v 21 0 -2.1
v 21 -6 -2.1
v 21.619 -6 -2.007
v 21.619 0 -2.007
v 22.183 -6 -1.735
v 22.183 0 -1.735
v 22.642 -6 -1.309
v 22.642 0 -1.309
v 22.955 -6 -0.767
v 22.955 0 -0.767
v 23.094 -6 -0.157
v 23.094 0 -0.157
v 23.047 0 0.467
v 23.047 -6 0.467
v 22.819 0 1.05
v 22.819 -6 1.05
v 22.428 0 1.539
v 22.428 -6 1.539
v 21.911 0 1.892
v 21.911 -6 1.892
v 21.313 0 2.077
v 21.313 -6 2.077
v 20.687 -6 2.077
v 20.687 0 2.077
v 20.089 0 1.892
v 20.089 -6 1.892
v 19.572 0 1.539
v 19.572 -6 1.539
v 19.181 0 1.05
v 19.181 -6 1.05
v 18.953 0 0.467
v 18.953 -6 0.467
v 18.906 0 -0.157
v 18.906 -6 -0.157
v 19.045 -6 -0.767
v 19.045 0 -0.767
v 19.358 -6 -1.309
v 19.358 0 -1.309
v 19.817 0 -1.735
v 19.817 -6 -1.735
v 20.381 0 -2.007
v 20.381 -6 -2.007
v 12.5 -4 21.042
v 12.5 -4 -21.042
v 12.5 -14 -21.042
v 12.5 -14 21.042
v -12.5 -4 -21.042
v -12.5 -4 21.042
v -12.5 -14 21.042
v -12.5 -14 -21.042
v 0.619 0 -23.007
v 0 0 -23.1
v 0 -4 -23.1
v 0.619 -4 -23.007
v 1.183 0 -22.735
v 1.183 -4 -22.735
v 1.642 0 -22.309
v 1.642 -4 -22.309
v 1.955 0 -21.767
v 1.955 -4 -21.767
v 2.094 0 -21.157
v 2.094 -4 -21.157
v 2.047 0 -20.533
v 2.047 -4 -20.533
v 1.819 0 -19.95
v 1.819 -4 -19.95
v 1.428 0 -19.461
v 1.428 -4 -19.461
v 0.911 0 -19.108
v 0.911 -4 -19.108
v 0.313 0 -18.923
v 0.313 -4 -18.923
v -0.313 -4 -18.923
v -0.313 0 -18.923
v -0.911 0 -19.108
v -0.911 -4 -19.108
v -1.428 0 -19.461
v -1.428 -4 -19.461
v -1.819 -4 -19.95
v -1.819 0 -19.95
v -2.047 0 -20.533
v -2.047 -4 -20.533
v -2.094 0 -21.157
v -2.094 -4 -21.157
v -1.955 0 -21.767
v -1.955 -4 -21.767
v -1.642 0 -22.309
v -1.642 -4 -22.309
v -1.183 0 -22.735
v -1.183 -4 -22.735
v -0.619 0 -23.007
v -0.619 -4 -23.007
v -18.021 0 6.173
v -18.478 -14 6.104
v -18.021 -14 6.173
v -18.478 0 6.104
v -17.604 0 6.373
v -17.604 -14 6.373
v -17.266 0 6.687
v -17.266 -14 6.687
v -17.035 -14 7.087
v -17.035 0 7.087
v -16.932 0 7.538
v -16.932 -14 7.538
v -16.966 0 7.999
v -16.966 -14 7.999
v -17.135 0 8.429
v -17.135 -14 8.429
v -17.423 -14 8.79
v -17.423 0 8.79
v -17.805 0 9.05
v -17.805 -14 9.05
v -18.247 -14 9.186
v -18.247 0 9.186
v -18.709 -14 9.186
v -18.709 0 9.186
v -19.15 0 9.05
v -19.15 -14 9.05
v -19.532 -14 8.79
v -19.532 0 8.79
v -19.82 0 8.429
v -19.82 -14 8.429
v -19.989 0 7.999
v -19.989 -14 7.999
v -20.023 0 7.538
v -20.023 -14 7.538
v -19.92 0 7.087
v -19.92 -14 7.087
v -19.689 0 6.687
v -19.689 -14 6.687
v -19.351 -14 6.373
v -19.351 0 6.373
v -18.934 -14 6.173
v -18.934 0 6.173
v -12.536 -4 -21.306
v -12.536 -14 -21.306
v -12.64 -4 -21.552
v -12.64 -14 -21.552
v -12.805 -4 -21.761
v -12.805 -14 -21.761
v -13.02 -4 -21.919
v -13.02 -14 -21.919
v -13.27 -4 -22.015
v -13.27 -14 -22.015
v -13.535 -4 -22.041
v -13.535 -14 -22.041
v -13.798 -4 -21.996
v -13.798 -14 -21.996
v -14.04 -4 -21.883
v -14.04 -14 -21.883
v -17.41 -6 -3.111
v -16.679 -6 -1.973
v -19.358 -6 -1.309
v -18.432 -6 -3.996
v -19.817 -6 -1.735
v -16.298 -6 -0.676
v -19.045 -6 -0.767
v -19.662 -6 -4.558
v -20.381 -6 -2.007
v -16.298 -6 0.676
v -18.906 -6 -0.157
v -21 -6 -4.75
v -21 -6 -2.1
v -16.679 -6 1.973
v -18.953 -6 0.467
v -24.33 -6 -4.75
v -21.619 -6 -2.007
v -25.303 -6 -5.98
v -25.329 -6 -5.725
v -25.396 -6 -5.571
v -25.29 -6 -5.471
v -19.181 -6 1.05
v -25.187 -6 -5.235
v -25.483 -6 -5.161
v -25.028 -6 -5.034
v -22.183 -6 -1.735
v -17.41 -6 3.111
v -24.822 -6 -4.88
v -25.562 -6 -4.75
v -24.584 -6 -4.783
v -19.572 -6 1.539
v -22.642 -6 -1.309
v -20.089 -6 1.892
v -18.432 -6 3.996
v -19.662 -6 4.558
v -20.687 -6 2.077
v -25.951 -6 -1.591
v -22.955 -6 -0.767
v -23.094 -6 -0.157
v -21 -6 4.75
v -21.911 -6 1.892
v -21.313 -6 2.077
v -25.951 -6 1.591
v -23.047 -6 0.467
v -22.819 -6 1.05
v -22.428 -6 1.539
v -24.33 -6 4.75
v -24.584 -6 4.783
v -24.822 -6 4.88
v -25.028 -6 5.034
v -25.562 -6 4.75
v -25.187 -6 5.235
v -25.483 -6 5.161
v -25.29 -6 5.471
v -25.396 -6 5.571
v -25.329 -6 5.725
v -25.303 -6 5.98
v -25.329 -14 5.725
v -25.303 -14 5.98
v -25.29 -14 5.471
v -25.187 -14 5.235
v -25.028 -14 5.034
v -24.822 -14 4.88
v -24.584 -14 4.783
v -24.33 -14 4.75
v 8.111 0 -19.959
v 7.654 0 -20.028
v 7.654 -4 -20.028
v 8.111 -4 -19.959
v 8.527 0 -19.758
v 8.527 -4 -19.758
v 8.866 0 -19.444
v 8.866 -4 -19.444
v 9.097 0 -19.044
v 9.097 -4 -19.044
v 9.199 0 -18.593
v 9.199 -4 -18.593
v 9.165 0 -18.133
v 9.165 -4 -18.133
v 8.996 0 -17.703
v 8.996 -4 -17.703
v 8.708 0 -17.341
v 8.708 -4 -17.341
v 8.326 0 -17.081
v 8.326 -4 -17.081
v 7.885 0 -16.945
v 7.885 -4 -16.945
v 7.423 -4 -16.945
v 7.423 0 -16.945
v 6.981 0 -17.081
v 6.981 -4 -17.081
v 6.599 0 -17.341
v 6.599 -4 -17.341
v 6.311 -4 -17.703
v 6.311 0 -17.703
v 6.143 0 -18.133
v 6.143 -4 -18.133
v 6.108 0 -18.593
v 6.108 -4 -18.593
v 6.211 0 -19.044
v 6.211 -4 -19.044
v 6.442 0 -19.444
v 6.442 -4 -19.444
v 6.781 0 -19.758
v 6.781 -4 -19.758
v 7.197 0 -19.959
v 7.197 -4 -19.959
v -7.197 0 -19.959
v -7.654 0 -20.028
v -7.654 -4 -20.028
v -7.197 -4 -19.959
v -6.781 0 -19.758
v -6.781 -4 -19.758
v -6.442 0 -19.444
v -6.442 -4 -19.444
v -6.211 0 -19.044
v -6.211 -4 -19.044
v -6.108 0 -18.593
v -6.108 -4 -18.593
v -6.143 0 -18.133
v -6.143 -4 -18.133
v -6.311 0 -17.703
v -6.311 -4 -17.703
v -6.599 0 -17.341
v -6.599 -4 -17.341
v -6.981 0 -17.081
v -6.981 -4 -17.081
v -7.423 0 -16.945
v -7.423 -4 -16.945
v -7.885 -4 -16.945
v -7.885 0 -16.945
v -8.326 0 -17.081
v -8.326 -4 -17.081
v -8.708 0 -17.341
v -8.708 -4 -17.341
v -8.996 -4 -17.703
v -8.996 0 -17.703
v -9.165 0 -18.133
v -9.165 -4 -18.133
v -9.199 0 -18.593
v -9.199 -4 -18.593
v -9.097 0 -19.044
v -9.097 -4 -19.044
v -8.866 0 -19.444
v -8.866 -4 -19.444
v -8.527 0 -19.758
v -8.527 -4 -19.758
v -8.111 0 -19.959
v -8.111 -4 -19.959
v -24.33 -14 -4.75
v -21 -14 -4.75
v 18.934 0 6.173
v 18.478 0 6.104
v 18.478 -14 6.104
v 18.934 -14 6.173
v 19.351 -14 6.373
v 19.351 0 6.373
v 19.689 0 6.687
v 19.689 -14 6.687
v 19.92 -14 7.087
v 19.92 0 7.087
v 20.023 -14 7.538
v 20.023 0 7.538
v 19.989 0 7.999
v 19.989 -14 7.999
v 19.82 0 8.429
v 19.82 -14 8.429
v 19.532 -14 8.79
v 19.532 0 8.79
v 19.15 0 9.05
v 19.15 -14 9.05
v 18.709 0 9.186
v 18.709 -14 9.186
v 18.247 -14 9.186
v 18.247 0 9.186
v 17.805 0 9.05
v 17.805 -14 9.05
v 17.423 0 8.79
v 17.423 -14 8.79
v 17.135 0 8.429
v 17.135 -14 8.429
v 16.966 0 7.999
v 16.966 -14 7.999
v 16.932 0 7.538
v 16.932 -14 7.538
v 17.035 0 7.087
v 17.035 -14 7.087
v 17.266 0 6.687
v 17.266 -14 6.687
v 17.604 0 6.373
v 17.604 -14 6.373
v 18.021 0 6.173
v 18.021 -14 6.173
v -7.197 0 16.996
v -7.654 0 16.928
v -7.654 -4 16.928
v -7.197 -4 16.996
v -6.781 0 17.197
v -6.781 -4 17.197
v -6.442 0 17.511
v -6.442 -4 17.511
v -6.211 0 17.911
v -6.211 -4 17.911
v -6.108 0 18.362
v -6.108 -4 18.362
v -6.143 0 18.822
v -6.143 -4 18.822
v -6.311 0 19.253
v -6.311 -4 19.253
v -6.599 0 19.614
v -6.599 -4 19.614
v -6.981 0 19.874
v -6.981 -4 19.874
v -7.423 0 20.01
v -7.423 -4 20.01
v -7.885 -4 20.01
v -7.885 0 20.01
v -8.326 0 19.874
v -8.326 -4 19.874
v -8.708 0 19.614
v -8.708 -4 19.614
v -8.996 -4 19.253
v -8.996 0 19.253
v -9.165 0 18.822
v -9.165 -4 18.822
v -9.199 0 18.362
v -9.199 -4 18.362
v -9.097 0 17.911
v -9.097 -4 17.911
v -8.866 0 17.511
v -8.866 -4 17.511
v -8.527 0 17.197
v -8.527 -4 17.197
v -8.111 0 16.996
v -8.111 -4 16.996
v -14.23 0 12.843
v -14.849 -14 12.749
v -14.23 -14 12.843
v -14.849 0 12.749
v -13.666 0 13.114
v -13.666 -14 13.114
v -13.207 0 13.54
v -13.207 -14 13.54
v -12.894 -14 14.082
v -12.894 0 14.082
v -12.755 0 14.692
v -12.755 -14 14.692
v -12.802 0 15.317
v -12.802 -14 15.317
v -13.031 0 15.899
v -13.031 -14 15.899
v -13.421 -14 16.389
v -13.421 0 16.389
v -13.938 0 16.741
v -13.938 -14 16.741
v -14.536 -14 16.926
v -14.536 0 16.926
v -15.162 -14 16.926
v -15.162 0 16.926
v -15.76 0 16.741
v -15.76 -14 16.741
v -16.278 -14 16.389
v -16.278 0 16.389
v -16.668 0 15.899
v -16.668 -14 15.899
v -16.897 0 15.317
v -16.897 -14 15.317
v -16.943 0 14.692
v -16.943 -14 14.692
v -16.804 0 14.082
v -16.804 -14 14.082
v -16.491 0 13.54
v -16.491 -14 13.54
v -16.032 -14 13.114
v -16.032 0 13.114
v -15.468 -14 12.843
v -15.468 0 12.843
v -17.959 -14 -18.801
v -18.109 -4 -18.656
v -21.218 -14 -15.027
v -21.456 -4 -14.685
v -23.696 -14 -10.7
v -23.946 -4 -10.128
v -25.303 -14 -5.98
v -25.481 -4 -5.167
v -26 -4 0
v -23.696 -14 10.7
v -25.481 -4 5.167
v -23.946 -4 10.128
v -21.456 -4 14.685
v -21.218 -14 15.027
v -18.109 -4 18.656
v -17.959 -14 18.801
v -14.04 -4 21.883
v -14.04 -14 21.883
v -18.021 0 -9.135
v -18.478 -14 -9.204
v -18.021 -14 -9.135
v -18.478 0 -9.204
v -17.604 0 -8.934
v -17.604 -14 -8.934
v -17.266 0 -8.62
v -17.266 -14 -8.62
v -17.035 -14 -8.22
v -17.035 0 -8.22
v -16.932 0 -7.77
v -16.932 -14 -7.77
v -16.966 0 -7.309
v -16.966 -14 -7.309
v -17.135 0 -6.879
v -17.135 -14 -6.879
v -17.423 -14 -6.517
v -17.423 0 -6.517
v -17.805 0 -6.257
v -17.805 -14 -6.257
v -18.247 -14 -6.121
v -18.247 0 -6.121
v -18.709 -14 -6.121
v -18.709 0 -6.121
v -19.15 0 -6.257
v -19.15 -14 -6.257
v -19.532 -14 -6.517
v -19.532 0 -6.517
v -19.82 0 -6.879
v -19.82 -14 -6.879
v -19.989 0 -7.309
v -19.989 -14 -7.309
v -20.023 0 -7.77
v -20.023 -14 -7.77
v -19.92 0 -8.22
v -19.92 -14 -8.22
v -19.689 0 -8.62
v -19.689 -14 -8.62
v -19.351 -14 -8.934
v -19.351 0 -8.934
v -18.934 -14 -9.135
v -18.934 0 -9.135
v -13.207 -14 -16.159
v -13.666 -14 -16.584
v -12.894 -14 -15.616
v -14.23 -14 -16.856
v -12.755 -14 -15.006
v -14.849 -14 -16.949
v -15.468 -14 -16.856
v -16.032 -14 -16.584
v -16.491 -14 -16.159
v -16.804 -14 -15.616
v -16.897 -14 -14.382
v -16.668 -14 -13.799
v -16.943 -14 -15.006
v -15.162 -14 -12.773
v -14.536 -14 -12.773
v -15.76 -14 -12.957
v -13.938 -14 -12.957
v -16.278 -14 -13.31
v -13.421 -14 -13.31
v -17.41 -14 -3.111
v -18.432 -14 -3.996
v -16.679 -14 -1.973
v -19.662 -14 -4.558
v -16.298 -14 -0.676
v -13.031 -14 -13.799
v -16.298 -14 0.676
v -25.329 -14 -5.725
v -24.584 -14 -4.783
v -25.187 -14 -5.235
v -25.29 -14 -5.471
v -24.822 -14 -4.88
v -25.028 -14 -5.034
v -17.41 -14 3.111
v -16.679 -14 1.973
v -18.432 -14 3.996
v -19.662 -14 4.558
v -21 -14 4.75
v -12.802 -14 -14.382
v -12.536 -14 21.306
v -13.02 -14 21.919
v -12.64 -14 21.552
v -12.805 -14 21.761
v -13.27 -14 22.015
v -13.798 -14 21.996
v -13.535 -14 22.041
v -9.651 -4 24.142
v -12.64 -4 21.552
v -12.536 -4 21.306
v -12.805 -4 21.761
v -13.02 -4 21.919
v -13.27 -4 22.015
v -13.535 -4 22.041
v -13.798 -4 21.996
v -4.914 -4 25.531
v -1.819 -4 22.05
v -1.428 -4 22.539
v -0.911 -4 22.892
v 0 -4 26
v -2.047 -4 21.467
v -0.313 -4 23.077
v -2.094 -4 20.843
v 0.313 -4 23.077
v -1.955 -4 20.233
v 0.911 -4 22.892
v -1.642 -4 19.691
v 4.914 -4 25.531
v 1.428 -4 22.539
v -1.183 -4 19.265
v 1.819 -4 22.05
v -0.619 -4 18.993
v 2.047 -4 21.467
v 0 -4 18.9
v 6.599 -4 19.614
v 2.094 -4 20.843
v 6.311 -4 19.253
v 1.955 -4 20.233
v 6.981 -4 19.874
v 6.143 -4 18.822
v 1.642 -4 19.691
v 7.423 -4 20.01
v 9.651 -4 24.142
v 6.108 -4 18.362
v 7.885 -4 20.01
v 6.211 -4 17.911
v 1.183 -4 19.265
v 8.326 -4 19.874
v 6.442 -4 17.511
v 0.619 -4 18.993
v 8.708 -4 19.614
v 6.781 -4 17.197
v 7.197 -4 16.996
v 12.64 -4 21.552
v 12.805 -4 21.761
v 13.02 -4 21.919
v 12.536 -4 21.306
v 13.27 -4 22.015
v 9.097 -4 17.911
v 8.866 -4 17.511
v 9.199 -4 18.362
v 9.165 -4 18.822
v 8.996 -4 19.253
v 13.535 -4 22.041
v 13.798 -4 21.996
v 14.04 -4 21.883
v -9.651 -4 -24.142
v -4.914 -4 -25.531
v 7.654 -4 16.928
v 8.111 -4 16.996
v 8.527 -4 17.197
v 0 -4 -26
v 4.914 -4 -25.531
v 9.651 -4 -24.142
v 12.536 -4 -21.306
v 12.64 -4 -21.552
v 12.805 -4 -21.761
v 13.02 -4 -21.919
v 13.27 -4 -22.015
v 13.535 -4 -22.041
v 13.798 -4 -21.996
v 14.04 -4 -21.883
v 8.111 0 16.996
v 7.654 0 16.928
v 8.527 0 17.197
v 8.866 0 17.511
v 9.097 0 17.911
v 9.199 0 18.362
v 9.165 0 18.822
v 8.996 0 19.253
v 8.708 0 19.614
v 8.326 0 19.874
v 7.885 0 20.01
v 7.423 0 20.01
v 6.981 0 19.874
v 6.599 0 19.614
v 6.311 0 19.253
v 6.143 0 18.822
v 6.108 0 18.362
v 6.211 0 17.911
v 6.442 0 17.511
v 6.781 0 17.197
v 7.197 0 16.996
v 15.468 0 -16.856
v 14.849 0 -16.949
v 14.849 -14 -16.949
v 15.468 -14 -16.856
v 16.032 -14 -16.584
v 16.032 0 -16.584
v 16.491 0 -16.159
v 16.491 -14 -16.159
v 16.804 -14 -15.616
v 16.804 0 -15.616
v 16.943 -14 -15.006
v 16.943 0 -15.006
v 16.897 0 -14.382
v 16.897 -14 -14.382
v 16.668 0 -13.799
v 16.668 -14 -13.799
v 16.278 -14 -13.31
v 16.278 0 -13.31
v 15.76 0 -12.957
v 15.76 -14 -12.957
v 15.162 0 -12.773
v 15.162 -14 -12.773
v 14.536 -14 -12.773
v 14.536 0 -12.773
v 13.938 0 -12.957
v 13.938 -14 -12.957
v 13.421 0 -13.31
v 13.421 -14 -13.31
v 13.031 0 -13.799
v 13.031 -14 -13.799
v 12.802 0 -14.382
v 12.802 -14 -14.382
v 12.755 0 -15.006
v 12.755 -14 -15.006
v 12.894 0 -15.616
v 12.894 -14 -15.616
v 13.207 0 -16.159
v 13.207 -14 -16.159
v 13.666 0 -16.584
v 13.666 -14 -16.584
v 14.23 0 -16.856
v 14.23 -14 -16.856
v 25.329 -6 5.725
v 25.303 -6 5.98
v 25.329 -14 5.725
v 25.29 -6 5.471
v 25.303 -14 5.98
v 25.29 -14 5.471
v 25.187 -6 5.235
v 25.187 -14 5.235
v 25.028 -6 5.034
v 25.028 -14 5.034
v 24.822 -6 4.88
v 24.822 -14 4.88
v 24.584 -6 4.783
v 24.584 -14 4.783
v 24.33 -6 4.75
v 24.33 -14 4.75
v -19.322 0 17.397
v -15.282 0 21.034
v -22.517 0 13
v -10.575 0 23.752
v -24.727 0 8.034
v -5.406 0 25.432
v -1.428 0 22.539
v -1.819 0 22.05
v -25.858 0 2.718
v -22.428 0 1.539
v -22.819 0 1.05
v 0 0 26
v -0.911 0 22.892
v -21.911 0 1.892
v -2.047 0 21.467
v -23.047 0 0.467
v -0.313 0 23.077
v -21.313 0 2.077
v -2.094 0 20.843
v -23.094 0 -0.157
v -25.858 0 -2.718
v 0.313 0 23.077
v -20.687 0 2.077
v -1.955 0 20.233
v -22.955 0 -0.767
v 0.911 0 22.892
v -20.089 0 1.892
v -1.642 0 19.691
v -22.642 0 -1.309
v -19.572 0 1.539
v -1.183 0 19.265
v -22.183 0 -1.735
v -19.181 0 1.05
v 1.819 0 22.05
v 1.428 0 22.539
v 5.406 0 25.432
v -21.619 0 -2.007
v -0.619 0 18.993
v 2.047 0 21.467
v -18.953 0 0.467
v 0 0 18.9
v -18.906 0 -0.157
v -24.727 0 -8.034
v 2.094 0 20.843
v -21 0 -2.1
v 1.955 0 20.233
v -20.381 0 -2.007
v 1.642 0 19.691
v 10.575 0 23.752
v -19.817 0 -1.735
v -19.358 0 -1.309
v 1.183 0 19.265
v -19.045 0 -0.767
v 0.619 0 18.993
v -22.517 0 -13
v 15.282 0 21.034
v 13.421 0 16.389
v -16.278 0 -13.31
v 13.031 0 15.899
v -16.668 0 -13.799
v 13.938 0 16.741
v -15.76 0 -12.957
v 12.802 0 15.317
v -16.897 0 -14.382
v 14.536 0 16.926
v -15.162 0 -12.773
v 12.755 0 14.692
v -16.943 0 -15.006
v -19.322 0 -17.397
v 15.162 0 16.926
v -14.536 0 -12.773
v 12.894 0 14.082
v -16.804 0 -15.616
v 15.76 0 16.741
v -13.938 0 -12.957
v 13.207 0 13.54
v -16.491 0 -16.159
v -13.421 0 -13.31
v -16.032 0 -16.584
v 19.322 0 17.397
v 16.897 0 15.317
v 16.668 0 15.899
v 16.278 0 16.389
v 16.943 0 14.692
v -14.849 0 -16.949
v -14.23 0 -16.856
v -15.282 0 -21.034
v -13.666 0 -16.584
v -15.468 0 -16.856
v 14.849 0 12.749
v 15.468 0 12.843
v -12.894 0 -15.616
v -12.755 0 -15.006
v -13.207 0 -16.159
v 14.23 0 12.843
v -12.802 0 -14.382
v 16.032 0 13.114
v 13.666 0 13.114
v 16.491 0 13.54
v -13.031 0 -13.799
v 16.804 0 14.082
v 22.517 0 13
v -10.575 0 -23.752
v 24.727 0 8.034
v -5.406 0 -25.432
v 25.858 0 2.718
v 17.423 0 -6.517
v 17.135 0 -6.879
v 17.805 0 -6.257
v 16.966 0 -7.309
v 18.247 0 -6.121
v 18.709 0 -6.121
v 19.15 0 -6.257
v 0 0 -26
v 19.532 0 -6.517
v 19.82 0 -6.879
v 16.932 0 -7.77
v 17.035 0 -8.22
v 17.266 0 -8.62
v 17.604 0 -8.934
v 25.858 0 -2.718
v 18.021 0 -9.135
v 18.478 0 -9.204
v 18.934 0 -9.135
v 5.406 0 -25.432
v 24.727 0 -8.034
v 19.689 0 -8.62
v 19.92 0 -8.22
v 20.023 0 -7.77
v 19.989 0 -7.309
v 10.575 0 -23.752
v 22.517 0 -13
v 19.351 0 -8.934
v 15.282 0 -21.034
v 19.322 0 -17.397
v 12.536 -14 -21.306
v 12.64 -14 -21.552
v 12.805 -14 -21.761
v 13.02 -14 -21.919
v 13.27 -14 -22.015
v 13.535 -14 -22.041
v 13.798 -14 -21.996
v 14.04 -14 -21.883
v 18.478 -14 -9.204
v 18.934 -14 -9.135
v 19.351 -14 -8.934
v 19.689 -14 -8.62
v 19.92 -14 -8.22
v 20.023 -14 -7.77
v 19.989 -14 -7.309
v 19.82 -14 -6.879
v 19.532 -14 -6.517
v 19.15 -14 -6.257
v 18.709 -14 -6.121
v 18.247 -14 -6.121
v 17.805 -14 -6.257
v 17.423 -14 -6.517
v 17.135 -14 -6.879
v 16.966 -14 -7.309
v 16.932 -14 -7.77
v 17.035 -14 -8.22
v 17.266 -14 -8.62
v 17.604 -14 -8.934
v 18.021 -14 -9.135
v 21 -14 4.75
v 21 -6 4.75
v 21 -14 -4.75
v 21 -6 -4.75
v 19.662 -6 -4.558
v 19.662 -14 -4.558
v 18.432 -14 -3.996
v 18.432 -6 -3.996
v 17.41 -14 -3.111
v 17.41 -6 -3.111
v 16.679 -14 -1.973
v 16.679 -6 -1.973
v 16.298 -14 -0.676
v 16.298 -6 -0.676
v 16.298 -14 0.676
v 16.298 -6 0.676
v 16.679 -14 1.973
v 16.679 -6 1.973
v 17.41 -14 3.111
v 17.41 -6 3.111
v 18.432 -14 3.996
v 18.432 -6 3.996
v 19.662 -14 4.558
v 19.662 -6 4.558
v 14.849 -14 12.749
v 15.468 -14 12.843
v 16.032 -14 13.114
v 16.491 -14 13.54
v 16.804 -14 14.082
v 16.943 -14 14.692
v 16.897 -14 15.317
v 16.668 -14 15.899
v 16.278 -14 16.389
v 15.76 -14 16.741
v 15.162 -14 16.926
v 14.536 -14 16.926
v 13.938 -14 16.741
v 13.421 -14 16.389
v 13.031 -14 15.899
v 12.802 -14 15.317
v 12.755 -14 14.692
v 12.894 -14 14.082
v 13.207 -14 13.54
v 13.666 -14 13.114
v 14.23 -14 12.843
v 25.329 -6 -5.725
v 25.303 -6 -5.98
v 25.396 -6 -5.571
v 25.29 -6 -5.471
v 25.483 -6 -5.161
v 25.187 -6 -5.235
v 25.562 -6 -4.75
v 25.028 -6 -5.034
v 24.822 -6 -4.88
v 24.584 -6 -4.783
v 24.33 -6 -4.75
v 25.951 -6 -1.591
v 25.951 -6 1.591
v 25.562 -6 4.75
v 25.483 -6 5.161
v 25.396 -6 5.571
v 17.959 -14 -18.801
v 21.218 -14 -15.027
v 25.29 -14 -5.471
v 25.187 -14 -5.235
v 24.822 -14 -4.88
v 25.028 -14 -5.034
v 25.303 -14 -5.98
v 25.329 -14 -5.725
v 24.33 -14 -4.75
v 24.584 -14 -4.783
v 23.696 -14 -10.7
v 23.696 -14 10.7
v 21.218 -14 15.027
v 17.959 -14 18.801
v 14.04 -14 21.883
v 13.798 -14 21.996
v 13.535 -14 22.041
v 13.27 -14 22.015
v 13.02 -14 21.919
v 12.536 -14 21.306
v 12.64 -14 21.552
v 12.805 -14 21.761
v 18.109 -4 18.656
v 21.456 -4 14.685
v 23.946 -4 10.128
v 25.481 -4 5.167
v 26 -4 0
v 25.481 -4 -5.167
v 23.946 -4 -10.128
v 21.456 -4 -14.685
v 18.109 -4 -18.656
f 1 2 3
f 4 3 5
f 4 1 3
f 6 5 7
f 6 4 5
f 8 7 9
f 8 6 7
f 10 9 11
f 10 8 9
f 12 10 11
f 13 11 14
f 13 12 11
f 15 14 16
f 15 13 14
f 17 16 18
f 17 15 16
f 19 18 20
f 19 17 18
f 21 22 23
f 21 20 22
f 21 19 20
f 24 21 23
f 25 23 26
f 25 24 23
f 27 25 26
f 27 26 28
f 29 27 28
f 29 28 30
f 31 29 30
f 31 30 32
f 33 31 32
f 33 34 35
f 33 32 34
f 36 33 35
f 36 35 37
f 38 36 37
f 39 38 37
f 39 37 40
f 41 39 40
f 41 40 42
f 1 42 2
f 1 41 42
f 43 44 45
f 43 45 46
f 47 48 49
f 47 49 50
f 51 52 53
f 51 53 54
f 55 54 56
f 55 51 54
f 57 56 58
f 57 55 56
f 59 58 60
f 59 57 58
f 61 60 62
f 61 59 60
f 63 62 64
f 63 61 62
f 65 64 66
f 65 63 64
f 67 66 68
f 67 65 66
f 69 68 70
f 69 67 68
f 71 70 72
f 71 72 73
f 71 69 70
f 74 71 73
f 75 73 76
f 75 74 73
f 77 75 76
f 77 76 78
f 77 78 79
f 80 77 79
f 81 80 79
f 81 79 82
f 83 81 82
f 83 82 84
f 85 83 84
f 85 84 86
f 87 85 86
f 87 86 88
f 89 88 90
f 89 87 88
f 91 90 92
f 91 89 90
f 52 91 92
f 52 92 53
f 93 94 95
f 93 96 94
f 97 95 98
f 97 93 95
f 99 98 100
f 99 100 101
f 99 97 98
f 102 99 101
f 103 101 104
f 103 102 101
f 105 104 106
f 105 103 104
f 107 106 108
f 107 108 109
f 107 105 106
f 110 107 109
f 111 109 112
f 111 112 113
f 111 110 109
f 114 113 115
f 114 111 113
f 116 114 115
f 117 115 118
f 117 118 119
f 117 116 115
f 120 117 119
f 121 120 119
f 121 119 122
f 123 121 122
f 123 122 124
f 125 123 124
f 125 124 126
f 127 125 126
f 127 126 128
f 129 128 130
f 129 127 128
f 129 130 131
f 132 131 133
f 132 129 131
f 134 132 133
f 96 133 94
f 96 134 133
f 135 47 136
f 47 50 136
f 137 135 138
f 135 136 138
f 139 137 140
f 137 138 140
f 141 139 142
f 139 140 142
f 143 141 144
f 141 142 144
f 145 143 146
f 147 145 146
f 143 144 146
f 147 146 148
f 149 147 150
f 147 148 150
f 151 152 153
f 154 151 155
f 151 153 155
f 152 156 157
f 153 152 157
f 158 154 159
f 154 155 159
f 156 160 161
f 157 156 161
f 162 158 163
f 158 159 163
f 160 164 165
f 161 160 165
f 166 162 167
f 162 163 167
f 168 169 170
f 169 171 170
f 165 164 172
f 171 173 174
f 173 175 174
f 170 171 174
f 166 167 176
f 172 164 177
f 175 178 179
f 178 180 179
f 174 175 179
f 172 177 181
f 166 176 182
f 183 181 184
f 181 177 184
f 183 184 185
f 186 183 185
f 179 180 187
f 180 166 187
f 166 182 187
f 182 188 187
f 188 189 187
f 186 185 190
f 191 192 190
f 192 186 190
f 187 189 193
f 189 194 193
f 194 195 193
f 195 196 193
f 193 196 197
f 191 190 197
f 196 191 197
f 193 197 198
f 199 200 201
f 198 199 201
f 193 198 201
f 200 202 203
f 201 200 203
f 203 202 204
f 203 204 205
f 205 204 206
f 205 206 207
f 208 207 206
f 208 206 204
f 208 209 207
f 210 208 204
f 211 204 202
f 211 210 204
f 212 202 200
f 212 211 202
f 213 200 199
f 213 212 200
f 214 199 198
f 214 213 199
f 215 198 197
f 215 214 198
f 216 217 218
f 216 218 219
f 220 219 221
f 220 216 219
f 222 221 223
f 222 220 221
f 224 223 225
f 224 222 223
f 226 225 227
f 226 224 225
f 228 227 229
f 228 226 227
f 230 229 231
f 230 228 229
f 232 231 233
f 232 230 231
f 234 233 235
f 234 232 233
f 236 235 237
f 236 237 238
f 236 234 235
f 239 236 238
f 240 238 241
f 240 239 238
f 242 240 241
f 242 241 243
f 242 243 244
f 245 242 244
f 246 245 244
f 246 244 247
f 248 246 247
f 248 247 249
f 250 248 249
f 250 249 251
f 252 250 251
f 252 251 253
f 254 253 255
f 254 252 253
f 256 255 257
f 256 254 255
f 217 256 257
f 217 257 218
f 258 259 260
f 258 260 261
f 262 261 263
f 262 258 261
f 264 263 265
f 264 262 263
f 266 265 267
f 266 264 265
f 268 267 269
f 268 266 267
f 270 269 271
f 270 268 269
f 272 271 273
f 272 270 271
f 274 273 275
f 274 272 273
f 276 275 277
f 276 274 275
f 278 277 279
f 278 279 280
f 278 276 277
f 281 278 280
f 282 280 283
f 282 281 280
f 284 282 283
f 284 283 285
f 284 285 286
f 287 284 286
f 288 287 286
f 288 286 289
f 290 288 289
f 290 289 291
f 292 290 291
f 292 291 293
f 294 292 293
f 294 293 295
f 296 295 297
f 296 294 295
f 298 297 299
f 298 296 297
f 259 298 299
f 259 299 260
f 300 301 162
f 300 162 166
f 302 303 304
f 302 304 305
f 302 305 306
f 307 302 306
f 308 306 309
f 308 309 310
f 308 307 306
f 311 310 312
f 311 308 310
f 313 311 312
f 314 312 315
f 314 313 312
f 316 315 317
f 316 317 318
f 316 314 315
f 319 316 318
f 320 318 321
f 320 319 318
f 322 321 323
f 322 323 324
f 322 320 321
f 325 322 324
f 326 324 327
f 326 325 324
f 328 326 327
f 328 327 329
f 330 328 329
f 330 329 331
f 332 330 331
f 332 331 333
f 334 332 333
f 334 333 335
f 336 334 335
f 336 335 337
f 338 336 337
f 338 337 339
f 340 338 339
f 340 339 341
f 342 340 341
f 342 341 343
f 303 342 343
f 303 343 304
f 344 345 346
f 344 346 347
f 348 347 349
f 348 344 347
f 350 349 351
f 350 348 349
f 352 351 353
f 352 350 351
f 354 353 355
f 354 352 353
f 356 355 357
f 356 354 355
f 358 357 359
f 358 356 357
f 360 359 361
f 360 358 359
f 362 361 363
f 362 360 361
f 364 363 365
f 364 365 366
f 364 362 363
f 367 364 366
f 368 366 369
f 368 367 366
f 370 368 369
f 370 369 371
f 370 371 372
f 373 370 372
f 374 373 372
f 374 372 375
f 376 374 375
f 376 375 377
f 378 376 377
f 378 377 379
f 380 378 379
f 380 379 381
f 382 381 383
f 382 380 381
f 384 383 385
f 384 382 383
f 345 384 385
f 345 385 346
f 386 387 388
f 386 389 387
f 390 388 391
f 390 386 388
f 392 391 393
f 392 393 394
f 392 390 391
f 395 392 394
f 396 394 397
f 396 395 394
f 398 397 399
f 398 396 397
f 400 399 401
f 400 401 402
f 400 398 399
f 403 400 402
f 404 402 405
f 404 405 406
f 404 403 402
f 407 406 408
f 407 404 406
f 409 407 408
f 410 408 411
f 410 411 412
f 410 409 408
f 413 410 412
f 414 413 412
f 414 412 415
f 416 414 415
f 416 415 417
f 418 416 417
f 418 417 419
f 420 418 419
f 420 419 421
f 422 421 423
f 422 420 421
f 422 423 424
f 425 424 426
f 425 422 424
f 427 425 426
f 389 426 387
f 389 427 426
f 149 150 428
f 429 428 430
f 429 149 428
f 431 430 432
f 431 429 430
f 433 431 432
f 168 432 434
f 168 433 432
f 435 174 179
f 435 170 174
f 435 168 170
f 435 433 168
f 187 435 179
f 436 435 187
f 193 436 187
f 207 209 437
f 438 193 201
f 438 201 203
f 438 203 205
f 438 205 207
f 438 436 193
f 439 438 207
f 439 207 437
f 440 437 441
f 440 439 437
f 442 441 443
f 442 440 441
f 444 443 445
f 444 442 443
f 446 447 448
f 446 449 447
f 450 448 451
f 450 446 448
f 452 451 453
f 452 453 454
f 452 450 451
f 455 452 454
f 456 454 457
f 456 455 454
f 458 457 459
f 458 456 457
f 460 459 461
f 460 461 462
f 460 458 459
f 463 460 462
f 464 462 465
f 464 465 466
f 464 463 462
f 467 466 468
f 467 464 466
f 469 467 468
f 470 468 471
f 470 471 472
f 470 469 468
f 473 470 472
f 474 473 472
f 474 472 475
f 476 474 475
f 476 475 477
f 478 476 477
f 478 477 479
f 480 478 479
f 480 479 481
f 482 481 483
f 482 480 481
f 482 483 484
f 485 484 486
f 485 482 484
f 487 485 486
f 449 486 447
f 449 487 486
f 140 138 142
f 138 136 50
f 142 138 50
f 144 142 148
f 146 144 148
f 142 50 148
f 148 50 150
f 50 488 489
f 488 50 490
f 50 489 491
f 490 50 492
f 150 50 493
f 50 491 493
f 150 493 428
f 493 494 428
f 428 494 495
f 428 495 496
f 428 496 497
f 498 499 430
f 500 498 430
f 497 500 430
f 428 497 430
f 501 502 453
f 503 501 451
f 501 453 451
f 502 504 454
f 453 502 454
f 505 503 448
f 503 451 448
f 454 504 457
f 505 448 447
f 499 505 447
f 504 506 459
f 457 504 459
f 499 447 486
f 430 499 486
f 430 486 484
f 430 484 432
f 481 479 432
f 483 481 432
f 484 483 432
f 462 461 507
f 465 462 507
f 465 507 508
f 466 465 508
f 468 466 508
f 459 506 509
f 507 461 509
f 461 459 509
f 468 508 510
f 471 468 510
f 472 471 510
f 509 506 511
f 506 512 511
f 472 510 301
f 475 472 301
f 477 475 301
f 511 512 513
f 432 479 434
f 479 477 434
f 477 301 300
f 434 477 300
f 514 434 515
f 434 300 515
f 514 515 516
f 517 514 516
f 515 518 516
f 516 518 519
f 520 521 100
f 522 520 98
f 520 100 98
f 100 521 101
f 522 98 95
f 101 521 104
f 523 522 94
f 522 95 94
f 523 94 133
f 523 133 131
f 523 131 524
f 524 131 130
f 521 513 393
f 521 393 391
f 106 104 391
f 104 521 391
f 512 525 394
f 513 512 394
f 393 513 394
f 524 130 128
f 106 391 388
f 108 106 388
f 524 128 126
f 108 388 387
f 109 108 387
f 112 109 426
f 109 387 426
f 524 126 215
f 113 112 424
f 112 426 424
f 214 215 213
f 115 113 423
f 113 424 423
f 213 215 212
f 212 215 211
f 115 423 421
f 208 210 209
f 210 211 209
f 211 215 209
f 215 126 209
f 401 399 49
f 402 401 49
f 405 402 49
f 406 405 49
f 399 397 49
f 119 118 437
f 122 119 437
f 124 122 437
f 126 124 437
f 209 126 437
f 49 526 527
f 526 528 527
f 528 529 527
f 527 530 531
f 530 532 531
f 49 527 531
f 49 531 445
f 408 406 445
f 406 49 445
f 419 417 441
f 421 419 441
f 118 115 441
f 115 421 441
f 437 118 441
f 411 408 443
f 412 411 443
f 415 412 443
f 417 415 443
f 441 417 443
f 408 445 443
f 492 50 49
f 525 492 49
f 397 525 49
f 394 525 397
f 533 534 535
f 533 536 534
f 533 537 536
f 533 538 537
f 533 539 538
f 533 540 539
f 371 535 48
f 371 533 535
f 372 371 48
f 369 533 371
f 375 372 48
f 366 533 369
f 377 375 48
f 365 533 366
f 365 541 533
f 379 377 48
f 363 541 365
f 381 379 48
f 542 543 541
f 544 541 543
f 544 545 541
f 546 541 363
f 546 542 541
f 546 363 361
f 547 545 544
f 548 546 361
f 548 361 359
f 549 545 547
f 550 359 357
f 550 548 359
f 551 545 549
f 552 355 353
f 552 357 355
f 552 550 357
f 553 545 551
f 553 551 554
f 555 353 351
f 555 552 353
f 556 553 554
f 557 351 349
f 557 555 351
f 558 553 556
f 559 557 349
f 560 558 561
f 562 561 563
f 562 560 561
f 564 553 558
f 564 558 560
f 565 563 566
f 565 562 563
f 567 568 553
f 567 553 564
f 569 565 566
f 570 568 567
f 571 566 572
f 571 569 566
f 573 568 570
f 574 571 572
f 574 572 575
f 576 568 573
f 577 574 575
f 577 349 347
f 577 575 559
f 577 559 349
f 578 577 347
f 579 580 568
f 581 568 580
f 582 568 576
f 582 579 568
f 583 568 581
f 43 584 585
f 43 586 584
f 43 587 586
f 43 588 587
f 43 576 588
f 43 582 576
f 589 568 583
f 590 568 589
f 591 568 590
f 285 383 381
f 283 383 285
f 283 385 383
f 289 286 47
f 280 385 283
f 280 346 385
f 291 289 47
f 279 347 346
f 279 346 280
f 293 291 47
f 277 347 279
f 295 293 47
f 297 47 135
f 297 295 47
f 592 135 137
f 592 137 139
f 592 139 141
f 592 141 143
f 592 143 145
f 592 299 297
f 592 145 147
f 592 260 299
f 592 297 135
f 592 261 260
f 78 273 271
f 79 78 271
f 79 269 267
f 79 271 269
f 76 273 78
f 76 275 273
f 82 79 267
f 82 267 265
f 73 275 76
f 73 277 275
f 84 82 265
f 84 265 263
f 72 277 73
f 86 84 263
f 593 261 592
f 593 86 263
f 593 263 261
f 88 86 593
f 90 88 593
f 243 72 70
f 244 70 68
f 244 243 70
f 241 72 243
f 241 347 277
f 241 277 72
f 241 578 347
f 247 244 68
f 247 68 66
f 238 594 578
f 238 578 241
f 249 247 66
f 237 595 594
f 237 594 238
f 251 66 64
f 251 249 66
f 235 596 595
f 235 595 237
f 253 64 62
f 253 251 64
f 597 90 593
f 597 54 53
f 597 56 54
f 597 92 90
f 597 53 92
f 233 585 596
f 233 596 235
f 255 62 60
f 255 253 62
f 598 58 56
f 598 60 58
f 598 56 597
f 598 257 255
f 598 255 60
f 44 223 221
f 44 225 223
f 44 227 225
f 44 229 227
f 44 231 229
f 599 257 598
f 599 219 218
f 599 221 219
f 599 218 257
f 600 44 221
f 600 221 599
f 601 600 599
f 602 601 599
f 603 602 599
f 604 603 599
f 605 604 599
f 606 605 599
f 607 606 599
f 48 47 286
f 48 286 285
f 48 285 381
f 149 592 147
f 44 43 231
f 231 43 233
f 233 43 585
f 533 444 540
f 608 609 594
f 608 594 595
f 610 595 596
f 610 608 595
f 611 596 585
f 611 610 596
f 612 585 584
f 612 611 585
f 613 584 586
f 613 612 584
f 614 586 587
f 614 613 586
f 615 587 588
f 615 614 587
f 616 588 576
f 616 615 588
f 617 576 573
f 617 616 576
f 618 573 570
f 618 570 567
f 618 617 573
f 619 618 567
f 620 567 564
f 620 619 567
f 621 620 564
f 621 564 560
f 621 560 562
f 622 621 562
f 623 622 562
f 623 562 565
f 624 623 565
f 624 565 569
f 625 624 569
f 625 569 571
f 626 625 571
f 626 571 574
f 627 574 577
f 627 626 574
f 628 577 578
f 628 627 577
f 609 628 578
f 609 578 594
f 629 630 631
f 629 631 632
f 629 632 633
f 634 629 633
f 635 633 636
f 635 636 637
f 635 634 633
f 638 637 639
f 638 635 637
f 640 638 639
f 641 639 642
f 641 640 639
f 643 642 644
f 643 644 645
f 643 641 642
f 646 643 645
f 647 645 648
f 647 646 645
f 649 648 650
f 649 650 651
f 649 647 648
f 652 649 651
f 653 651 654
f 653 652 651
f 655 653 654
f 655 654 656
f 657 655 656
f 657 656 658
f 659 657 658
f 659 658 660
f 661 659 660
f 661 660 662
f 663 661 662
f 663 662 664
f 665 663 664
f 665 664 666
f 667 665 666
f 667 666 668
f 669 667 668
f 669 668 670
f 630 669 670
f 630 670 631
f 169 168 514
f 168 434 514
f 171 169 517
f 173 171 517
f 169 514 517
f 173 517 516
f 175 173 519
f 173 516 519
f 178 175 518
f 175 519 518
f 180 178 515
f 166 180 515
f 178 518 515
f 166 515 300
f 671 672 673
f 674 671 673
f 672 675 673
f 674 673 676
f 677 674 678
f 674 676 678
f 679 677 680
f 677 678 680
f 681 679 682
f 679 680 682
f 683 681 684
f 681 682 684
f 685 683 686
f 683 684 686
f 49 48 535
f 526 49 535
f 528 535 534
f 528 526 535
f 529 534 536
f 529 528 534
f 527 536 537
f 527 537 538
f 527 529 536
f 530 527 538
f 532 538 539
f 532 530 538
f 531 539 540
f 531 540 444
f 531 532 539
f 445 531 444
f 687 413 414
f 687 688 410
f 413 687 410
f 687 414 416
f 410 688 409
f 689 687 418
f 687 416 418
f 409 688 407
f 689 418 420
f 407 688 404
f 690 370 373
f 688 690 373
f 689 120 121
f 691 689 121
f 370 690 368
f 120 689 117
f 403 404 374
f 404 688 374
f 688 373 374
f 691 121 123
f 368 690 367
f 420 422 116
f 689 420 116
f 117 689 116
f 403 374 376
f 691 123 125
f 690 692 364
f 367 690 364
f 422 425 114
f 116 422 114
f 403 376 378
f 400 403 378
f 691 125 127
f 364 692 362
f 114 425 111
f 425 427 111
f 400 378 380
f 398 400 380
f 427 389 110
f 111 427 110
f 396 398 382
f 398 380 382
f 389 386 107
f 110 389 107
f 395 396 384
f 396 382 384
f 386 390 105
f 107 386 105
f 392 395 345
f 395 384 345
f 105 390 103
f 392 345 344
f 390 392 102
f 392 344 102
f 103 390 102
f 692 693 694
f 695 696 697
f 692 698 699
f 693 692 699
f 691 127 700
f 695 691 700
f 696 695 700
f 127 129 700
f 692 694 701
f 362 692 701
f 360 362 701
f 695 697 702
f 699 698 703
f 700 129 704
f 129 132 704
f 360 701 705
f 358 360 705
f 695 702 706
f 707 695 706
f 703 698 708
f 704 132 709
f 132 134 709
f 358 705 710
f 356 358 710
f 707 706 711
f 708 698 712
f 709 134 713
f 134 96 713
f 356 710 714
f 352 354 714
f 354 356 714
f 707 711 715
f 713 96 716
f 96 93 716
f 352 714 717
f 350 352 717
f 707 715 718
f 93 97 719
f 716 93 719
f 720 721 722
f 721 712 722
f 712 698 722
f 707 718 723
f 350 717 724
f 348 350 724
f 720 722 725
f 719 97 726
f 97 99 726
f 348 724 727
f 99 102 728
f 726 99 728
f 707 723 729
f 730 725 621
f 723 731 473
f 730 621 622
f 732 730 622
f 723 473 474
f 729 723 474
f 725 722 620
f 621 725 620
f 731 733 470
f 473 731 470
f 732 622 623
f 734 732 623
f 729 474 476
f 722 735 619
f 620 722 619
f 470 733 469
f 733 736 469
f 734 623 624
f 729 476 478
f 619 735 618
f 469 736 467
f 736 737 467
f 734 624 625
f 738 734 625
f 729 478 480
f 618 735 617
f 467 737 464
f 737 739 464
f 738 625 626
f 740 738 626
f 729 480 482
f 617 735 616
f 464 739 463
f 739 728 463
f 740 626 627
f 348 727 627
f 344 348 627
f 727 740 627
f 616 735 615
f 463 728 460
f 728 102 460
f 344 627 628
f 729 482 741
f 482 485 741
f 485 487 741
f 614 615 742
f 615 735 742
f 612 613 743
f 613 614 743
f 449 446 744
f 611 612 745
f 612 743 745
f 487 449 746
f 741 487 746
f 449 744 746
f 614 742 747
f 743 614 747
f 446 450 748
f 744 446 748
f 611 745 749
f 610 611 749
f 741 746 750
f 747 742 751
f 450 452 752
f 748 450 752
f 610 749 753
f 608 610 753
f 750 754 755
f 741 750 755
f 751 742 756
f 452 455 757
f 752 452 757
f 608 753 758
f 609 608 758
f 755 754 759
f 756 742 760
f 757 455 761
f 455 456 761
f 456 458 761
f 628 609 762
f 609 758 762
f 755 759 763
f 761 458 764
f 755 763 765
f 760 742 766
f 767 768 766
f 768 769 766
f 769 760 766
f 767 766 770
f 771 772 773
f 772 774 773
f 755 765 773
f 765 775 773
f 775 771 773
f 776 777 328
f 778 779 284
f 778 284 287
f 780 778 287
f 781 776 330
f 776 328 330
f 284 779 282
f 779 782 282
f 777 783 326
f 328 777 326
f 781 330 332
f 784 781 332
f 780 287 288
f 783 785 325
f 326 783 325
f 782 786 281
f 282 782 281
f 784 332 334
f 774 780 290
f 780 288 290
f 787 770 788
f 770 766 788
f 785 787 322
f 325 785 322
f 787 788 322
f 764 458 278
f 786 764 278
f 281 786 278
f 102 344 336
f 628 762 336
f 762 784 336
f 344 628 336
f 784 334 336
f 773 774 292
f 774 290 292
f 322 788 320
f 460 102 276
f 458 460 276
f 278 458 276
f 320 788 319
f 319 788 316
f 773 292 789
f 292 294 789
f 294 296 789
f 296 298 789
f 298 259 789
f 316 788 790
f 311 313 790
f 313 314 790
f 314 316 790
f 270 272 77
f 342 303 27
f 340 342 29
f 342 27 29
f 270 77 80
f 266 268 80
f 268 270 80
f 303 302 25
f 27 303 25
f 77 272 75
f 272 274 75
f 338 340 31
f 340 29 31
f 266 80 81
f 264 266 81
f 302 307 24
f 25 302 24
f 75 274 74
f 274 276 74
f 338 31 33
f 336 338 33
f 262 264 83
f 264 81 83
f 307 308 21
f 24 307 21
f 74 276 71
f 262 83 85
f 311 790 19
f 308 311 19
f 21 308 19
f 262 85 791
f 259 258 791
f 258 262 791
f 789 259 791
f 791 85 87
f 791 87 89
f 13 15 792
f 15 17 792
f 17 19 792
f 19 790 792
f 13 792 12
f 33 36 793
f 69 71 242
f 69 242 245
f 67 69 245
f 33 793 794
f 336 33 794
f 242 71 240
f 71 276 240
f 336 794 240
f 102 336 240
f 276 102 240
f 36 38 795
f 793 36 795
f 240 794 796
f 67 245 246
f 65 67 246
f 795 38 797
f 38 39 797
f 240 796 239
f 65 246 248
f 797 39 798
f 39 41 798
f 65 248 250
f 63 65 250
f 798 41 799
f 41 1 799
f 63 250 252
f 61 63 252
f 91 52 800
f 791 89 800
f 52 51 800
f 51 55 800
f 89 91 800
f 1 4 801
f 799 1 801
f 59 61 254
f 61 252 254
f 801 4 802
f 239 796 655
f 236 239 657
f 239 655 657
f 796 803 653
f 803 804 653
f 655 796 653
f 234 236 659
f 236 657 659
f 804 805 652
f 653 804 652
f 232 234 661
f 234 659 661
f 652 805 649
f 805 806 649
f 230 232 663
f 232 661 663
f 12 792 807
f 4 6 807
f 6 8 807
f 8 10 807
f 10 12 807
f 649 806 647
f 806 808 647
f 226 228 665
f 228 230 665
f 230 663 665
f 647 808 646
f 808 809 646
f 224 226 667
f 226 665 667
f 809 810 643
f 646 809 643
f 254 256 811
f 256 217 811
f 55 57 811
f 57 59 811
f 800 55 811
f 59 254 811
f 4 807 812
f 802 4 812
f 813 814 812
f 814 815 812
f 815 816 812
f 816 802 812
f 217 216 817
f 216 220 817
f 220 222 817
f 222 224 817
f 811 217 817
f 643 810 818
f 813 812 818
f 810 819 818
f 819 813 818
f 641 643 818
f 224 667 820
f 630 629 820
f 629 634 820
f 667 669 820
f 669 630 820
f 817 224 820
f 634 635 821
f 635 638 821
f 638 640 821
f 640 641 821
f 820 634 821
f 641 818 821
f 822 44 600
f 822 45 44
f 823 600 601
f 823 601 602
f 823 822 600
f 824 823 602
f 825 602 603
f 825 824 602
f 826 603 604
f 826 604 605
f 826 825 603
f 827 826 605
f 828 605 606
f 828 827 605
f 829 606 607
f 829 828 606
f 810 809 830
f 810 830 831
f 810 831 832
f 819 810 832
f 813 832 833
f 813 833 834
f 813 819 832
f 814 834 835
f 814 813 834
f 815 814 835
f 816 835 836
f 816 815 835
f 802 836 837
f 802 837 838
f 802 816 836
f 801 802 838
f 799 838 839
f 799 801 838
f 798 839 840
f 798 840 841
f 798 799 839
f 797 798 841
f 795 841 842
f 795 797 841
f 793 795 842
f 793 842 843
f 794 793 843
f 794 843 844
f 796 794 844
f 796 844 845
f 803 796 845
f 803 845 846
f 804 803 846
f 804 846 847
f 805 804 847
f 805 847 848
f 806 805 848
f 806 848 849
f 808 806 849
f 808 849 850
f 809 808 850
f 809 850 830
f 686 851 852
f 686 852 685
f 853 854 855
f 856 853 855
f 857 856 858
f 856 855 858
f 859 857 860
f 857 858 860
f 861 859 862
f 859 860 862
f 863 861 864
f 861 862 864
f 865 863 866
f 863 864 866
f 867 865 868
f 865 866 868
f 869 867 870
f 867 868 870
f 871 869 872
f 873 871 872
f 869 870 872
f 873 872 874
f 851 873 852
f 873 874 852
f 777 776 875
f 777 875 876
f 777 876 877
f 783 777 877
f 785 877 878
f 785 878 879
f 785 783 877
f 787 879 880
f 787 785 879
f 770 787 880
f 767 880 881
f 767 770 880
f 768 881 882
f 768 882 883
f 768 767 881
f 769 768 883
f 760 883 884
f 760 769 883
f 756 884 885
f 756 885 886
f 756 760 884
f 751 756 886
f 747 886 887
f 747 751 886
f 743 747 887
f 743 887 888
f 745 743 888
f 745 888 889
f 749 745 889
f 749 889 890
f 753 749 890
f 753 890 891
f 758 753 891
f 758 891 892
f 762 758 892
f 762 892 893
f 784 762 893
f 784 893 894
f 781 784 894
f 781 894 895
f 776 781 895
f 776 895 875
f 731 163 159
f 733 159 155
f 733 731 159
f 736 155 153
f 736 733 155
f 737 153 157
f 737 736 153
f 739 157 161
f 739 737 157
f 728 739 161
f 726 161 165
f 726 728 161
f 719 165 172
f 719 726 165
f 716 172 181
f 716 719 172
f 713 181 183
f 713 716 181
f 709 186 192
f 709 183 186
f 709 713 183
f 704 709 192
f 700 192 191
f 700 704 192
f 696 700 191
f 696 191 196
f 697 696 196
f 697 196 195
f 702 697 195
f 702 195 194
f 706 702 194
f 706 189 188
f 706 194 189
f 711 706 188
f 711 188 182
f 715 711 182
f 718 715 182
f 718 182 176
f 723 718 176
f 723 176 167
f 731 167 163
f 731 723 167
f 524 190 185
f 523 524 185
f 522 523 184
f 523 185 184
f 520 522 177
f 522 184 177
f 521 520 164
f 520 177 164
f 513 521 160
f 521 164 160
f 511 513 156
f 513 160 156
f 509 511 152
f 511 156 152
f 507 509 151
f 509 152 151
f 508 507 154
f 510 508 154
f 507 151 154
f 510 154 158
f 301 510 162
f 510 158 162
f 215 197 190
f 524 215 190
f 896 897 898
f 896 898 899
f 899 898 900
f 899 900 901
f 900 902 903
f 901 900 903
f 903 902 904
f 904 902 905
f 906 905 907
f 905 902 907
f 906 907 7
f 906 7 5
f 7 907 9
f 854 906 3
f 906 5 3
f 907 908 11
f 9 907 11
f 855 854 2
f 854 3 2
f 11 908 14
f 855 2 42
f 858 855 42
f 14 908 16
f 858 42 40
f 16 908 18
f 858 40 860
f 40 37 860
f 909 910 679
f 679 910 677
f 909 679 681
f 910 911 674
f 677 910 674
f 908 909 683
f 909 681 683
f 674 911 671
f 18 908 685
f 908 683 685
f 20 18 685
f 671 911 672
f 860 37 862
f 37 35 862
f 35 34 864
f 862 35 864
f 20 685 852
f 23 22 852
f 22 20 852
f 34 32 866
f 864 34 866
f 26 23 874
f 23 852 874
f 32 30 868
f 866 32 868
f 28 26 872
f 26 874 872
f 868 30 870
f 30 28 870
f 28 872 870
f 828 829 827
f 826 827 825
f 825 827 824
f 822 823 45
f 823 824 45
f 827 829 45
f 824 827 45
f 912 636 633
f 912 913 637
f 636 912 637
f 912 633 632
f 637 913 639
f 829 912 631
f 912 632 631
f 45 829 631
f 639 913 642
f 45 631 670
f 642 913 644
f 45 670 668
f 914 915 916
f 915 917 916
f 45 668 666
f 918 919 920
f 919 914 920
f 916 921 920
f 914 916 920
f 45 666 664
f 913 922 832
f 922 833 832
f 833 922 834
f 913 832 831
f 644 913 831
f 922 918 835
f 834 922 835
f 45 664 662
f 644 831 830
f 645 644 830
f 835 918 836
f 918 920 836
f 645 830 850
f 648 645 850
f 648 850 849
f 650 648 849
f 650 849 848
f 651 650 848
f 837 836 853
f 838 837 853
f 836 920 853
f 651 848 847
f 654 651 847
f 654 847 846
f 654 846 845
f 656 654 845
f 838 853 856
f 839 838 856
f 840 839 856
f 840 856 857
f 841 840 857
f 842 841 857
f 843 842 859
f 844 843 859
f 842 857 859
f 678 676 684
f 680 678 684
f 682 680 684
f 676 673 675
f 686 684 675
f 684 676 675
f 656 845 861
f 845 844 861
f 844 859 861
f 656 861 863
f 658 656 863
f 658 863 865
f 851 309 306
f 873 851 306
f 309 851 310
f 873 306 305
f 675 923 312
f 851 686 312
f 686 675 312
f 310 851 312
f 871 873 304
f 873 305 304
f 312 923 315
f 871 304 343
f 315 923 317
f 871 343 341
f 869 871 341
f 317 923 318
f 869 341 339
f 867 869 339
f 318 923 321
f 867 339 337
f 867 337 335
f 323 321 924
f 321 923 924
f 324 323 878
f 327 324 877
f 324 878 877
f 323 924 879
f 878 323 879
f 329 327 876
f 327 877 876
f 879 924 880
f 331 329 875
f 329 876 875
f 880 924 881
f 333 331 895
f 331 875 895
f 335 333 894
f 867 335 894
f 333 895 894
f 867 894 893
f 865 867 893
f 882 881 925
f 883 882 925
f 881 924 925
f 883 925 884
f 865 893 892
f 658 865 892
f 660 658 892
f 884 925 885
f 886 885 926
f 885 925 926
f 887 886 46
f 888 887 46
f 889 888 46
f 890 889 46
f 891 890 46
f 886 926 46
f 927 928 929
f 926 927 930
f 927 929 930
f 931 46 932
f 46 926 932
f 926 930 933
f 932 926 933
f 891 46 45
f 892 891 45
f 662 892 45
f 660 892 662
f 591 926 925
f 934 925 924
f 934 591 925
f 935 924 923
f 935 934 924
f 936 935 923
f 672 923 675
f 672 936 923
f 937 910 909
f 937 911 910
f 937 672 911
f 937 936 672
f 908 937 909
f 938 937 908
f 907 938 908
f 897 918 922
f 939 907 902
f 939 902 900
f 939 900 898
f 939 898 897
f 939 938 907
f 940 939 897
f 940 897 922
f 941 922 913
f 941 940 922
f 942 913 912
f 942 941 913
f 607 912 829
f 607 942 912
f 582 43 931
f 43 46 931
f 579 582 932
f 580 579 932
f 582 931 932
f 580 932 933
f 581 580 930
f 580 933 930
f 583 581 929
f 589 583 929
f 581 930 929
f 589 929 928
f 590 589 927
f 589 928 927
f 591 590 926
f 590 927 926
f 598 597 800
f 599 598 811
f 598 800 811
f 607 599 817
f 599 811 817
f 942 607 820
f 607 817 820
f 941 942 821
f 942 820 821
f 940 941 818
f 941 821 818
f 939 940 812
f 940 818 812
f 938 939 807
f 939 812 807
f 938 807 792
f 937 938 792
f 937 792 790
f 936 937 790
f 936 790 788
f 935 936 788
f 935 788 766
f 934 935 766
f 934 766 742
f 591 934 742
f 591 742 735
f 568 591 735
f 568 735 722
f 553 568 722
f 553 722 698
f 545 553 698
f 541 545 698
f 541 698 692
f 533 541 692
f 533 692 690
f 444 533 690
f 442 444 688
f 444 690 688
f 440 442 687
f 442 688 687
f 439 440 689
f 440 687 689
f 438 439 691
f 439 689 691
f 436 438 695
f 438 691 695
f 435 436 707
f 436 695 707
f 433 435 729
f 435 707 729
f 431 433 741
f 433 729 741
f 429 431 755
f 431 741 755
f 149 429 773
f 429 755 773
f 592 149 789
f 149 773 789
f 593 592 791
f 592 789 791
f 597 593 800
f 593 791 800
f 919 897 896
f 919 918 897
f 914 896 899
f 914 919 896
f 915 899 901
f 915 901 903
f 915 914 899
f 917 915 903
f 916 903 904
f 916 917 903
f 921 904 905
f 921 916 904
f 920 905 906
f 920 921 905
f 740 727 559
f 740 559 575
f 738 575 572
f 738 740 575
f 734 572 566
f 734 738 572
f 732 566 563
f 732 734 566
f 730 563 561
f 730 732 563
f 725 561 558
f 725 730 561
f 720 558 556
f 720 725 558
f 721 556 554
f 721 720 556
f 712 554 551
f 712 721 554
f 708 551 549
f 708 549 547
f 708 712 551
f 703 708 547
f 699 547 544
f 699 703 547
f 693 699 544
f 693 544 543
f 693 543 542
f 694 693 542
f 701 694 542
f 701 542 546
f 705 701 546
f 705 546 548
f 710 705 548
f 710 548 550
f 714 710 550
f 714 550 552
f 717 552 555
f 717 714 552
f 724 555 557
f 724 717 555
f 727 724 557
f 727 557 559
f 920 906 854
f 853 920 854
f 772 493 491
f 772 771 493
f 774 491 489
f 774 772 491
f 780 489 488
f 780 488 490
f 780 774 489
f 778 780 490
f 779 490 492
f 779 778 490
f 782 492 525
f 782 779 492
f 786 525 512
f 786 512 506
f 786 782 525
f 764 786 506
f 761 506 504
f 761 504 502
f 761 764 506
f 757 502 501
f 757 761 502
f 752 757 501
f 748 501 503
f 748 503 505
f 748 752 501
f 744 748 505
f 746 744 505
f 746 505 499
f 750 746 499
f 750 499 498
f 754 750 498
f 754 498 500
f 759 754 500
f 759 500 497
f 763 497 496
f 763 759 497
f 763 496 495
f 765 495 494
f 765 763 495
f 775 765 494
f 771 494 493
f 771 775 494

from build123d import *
from build123d.topology import SkipClean

# Parameters (mm, degrees)
SKETCH4_R           = 26
SKETCH4_R_2         = 2.1
SKETCH4_R_3         = 1.55
BOSS_EXTRUDE1_DEPTH = 4
SKETCH5_R           = 1.55
SKETCH5_R_2         = 2.1
BOSS_EXTRUDE2_DEPTH = 10
CUT_EXTRUDE1_START  = -8
CUT_EXTRUDE1_DEPTH  = 8
FILLET1_R           = 1


with BuildPart() as part:
    # Sketch4 → Boss-Extrude1 (new body)
    with BuildSketch(Plane(origin=(0, 0, 3), x_dir=(1, 0, 0), z_dir=(0, -1, 0))):
        with Locations(Location((0, -3, 0), (0, 0, 270))):
            Circle(SKETCH4_R)
        with Locations(Location((0, 18, 0), (0, 0, 270))):
            Circle(SKETCH4_R_2, mode=Mode.SUBTRACT)
        with Locations(Location((7.653668647, 15.47759065, 0), (0, 0, 270))):
            Circle(SKETCH4_R_3, mode=Mode.SUBTRACT)
        with Locations(Location((14.849242405, 11.849242405, 0), (0, 0, 270))):
            Circle(SKETCH4_R_2, mode=Mode.SUBTRACT)
        with Locations(Location((18.47759065, 4.653668647, 0), (0, 0, 270))):
            Circle(SKETCH4_R_3, mode=Mode.SUBTRACT)
        with Locations(Location((21, -3, 0), (0, 0, 270))):
            Circle(SKETCH4_R_2, mode=Mode.SUBTRACT)
        with Locations(Location((18.47759065, -10.653668647, 0), (0, 0, 270))):
            Circle(SKETCH4_R_3, mode=Mode.SUBTRACT)
        with Locations(Location((14.849242405, -17.849242405, 0), (0, 0, 270))):
            Circle(SKETCH4_R_2, mode=Mode.SUBTRACT)
        with Locations(Location((7.653668647, -21.47759065, 0), (0, 0, 270))):
            Circle(SKETCH4_R_3, mode=Mode.SUBTRACT)
        with Locations(Location((0, -24, 0), (0, 0, 270))):
            Circle(SKETCH4_R_2, mode=Mode.SUBTRACT)
        with Locations(Location((-7.653668647, -21.47759065, 0), (0, 0, 270))):
            Circle(SKETCH4_R_3, mode=Mode.SUBTRACT)
        with Locations(Location((-14.849242405, -17.849242405, 0), (0, 0, 270))):
            Circle(SKETCH4_R_2, mode=Mode.SUBTRACT)
        with Locations(Location((-18.47759065, -10.653668647, 0), (0, 0, 270))):
            Circle(SKETCH4_R_3, mode=Mode.SUBTRACT)
        with Locations(Location((-21, -3, 0), (0, 0, 270))):
            Circle(SKETCH4_R_2, mode=Mode.SUBTRACT)
        with Locations(Location((-18.47759065, 4.653668647, 0), (0, 0, 270))):
            Circle(SKETCH4_R_3, mode=Mode.SUBTRACT)
        with Locations(Location((-14.849242405, 11.849242405, 0), (0, 0, 270))):
            Circle(SKETCH4_R_2, mode=Mode.SUBTRACT)
        with Locations(Location((-7.653668647, 15.47759065, 0), (0, 0, 270))):
            Circle(SKETCH4_R_3, mode=Mode.SUBTRACT)
    extrude(amount=BOSS_EXTRUDE1_DEPTH)

    # Sketch5 → Boss-Extrude2 (add)
    # profile 1 of 2: a face of its own
    with SkipClean():  # the faces are left unmerged after this step: merging them gives an invalid solid
        with BuildSketch(Plane.XZ.offset(4)):
            with BuildLine():
                Line((-12.5, 22.79802623), (-12.5, -22.79802623))
                ThreePointArc((-12.5, -22.79802623), (-26, 0), (-12.5, 22.79802623))
            make_face()
            with Locations(Location((-18.47759065, 7.653668647, 0), (0, 0, 270))):
                Circle(SKETCH5_R, mode=Mode.SUBTRACT)
            with Locations(Location((-18.47759065, -7.653668647, 0), (0, 0, 270))):
                Circle(SKETCH5_R, mode=Mode.SUBTRACT)
            with Locations(Location((-14.849242405, -14.849242405, 0), (0, 0, 270))):
                Circle(SKETCH5_R_2, mode=Mode.SUBTRACT)
            with Locations(Location((-21, 0, 0), (0, 0, 270))):
                Circle(SKETCH5_R_2, mode=Mode.SUBTRACT)
            with Locations(Location((-14.849242405, 14.849242405, 0), (0, 0, 270))):
                Circle(SKETCH5_R_2, mode=Mode.SUBTRACT)
        # profile 2 of 2: a face of its own
        with BuildSketch(Plane.XZ.offset(4)):
            with BuildLine():
                Line((12.5, -22.79802623), (12.5, 22.79802623))
                ThreePointArc((12.5, 22.79802623), (26, 0), (12.5, -22.79802623))
            make_face()
            with Locations(Location((18.47759065, -7.653668647, 0), (0, 0, 270))):
                Circle(SKETCH5_R, mode=Mode.SUBTRACT)
            with Locations(Location((18.47759065, 7.653668647, 0), (0, 0, 270))):
                Circle(SKETCH5_R, mode=Mode.SUBTRACT)
            with Locations(Location((14.849242405, 14.849242405, 0), (0, 0, 270))):
                Circle(SKETCH5_R_2, mode=Mode.SUBTRACT)
            with Locations(Location((21, 0, 0), (0, 0, 270))):
                Circle(SKETCH5_R_2, mode=Mode.SUBTRACT)
            with Locations(Location((14.849242405, -14.849242405, 0), (0, 0, 270))):
                Circle(SKETCH5_R_2, mode=Mode.SUBTRACT)
        extrude(amount=BOSS_EXTRUDE2_DEPTH)

    # Sketch6 → Cut-Extrude1 (cut)
    with SkipClean():  # the faces are left unmerged after this step: merging them gives an invalid solid
        with BuildSketch(Plane.XZ.offset(14).offset(CUT_EXTRUDE1_START)):
            with BuildLine():
                Line((21, 4.75), (25.562423594, 4.75))
                ThreePointArc((25.562423594, 4.75), (26, 0), (25.562423594, -4.75))
                Line((25.562423594, -4.75), (21, -4.75))
                ThreePointArc((21, -4.75), (16.25, 0), (21, 4.75))
            make_face()
            with BuildLine():
                Line((-21, -4.75), (-25.562423594, -4.75))
                ThreePointArc((-25.562423594, -4.75), (-26, 0), (-25.562423594, 4.75))
                Line((-25.562423594, 4.75), (-21, 4.75))
                ThreePointArc((-21, 4.75), (-16.25, 0), (-21, -4.75))
            make_face()
        extrude(amount=CUT_EXTRUDE1_DEPTH, mode=Mode.SUBTRACT)

    # Fillet1
    fillet1_edges = [part.edges().sort_by_distance(p)[0] for p in [
        (-25.562423594, -10, -4.75),
        (-25.562423594, -10, 4.75),
        (25.562423594, -10, 4.75),
        (25.562423594, -10, -4.75),
        (-12.5, -9, 22.79802623),
        (-12.5, -9, -22.79802623),
        (12.5, -9, -22.79802623),
        (12.5, -9, 22.79802623),
    ]]
    fillet(fillet1_edges, radius=FILLET1_R)


solid = part.part
